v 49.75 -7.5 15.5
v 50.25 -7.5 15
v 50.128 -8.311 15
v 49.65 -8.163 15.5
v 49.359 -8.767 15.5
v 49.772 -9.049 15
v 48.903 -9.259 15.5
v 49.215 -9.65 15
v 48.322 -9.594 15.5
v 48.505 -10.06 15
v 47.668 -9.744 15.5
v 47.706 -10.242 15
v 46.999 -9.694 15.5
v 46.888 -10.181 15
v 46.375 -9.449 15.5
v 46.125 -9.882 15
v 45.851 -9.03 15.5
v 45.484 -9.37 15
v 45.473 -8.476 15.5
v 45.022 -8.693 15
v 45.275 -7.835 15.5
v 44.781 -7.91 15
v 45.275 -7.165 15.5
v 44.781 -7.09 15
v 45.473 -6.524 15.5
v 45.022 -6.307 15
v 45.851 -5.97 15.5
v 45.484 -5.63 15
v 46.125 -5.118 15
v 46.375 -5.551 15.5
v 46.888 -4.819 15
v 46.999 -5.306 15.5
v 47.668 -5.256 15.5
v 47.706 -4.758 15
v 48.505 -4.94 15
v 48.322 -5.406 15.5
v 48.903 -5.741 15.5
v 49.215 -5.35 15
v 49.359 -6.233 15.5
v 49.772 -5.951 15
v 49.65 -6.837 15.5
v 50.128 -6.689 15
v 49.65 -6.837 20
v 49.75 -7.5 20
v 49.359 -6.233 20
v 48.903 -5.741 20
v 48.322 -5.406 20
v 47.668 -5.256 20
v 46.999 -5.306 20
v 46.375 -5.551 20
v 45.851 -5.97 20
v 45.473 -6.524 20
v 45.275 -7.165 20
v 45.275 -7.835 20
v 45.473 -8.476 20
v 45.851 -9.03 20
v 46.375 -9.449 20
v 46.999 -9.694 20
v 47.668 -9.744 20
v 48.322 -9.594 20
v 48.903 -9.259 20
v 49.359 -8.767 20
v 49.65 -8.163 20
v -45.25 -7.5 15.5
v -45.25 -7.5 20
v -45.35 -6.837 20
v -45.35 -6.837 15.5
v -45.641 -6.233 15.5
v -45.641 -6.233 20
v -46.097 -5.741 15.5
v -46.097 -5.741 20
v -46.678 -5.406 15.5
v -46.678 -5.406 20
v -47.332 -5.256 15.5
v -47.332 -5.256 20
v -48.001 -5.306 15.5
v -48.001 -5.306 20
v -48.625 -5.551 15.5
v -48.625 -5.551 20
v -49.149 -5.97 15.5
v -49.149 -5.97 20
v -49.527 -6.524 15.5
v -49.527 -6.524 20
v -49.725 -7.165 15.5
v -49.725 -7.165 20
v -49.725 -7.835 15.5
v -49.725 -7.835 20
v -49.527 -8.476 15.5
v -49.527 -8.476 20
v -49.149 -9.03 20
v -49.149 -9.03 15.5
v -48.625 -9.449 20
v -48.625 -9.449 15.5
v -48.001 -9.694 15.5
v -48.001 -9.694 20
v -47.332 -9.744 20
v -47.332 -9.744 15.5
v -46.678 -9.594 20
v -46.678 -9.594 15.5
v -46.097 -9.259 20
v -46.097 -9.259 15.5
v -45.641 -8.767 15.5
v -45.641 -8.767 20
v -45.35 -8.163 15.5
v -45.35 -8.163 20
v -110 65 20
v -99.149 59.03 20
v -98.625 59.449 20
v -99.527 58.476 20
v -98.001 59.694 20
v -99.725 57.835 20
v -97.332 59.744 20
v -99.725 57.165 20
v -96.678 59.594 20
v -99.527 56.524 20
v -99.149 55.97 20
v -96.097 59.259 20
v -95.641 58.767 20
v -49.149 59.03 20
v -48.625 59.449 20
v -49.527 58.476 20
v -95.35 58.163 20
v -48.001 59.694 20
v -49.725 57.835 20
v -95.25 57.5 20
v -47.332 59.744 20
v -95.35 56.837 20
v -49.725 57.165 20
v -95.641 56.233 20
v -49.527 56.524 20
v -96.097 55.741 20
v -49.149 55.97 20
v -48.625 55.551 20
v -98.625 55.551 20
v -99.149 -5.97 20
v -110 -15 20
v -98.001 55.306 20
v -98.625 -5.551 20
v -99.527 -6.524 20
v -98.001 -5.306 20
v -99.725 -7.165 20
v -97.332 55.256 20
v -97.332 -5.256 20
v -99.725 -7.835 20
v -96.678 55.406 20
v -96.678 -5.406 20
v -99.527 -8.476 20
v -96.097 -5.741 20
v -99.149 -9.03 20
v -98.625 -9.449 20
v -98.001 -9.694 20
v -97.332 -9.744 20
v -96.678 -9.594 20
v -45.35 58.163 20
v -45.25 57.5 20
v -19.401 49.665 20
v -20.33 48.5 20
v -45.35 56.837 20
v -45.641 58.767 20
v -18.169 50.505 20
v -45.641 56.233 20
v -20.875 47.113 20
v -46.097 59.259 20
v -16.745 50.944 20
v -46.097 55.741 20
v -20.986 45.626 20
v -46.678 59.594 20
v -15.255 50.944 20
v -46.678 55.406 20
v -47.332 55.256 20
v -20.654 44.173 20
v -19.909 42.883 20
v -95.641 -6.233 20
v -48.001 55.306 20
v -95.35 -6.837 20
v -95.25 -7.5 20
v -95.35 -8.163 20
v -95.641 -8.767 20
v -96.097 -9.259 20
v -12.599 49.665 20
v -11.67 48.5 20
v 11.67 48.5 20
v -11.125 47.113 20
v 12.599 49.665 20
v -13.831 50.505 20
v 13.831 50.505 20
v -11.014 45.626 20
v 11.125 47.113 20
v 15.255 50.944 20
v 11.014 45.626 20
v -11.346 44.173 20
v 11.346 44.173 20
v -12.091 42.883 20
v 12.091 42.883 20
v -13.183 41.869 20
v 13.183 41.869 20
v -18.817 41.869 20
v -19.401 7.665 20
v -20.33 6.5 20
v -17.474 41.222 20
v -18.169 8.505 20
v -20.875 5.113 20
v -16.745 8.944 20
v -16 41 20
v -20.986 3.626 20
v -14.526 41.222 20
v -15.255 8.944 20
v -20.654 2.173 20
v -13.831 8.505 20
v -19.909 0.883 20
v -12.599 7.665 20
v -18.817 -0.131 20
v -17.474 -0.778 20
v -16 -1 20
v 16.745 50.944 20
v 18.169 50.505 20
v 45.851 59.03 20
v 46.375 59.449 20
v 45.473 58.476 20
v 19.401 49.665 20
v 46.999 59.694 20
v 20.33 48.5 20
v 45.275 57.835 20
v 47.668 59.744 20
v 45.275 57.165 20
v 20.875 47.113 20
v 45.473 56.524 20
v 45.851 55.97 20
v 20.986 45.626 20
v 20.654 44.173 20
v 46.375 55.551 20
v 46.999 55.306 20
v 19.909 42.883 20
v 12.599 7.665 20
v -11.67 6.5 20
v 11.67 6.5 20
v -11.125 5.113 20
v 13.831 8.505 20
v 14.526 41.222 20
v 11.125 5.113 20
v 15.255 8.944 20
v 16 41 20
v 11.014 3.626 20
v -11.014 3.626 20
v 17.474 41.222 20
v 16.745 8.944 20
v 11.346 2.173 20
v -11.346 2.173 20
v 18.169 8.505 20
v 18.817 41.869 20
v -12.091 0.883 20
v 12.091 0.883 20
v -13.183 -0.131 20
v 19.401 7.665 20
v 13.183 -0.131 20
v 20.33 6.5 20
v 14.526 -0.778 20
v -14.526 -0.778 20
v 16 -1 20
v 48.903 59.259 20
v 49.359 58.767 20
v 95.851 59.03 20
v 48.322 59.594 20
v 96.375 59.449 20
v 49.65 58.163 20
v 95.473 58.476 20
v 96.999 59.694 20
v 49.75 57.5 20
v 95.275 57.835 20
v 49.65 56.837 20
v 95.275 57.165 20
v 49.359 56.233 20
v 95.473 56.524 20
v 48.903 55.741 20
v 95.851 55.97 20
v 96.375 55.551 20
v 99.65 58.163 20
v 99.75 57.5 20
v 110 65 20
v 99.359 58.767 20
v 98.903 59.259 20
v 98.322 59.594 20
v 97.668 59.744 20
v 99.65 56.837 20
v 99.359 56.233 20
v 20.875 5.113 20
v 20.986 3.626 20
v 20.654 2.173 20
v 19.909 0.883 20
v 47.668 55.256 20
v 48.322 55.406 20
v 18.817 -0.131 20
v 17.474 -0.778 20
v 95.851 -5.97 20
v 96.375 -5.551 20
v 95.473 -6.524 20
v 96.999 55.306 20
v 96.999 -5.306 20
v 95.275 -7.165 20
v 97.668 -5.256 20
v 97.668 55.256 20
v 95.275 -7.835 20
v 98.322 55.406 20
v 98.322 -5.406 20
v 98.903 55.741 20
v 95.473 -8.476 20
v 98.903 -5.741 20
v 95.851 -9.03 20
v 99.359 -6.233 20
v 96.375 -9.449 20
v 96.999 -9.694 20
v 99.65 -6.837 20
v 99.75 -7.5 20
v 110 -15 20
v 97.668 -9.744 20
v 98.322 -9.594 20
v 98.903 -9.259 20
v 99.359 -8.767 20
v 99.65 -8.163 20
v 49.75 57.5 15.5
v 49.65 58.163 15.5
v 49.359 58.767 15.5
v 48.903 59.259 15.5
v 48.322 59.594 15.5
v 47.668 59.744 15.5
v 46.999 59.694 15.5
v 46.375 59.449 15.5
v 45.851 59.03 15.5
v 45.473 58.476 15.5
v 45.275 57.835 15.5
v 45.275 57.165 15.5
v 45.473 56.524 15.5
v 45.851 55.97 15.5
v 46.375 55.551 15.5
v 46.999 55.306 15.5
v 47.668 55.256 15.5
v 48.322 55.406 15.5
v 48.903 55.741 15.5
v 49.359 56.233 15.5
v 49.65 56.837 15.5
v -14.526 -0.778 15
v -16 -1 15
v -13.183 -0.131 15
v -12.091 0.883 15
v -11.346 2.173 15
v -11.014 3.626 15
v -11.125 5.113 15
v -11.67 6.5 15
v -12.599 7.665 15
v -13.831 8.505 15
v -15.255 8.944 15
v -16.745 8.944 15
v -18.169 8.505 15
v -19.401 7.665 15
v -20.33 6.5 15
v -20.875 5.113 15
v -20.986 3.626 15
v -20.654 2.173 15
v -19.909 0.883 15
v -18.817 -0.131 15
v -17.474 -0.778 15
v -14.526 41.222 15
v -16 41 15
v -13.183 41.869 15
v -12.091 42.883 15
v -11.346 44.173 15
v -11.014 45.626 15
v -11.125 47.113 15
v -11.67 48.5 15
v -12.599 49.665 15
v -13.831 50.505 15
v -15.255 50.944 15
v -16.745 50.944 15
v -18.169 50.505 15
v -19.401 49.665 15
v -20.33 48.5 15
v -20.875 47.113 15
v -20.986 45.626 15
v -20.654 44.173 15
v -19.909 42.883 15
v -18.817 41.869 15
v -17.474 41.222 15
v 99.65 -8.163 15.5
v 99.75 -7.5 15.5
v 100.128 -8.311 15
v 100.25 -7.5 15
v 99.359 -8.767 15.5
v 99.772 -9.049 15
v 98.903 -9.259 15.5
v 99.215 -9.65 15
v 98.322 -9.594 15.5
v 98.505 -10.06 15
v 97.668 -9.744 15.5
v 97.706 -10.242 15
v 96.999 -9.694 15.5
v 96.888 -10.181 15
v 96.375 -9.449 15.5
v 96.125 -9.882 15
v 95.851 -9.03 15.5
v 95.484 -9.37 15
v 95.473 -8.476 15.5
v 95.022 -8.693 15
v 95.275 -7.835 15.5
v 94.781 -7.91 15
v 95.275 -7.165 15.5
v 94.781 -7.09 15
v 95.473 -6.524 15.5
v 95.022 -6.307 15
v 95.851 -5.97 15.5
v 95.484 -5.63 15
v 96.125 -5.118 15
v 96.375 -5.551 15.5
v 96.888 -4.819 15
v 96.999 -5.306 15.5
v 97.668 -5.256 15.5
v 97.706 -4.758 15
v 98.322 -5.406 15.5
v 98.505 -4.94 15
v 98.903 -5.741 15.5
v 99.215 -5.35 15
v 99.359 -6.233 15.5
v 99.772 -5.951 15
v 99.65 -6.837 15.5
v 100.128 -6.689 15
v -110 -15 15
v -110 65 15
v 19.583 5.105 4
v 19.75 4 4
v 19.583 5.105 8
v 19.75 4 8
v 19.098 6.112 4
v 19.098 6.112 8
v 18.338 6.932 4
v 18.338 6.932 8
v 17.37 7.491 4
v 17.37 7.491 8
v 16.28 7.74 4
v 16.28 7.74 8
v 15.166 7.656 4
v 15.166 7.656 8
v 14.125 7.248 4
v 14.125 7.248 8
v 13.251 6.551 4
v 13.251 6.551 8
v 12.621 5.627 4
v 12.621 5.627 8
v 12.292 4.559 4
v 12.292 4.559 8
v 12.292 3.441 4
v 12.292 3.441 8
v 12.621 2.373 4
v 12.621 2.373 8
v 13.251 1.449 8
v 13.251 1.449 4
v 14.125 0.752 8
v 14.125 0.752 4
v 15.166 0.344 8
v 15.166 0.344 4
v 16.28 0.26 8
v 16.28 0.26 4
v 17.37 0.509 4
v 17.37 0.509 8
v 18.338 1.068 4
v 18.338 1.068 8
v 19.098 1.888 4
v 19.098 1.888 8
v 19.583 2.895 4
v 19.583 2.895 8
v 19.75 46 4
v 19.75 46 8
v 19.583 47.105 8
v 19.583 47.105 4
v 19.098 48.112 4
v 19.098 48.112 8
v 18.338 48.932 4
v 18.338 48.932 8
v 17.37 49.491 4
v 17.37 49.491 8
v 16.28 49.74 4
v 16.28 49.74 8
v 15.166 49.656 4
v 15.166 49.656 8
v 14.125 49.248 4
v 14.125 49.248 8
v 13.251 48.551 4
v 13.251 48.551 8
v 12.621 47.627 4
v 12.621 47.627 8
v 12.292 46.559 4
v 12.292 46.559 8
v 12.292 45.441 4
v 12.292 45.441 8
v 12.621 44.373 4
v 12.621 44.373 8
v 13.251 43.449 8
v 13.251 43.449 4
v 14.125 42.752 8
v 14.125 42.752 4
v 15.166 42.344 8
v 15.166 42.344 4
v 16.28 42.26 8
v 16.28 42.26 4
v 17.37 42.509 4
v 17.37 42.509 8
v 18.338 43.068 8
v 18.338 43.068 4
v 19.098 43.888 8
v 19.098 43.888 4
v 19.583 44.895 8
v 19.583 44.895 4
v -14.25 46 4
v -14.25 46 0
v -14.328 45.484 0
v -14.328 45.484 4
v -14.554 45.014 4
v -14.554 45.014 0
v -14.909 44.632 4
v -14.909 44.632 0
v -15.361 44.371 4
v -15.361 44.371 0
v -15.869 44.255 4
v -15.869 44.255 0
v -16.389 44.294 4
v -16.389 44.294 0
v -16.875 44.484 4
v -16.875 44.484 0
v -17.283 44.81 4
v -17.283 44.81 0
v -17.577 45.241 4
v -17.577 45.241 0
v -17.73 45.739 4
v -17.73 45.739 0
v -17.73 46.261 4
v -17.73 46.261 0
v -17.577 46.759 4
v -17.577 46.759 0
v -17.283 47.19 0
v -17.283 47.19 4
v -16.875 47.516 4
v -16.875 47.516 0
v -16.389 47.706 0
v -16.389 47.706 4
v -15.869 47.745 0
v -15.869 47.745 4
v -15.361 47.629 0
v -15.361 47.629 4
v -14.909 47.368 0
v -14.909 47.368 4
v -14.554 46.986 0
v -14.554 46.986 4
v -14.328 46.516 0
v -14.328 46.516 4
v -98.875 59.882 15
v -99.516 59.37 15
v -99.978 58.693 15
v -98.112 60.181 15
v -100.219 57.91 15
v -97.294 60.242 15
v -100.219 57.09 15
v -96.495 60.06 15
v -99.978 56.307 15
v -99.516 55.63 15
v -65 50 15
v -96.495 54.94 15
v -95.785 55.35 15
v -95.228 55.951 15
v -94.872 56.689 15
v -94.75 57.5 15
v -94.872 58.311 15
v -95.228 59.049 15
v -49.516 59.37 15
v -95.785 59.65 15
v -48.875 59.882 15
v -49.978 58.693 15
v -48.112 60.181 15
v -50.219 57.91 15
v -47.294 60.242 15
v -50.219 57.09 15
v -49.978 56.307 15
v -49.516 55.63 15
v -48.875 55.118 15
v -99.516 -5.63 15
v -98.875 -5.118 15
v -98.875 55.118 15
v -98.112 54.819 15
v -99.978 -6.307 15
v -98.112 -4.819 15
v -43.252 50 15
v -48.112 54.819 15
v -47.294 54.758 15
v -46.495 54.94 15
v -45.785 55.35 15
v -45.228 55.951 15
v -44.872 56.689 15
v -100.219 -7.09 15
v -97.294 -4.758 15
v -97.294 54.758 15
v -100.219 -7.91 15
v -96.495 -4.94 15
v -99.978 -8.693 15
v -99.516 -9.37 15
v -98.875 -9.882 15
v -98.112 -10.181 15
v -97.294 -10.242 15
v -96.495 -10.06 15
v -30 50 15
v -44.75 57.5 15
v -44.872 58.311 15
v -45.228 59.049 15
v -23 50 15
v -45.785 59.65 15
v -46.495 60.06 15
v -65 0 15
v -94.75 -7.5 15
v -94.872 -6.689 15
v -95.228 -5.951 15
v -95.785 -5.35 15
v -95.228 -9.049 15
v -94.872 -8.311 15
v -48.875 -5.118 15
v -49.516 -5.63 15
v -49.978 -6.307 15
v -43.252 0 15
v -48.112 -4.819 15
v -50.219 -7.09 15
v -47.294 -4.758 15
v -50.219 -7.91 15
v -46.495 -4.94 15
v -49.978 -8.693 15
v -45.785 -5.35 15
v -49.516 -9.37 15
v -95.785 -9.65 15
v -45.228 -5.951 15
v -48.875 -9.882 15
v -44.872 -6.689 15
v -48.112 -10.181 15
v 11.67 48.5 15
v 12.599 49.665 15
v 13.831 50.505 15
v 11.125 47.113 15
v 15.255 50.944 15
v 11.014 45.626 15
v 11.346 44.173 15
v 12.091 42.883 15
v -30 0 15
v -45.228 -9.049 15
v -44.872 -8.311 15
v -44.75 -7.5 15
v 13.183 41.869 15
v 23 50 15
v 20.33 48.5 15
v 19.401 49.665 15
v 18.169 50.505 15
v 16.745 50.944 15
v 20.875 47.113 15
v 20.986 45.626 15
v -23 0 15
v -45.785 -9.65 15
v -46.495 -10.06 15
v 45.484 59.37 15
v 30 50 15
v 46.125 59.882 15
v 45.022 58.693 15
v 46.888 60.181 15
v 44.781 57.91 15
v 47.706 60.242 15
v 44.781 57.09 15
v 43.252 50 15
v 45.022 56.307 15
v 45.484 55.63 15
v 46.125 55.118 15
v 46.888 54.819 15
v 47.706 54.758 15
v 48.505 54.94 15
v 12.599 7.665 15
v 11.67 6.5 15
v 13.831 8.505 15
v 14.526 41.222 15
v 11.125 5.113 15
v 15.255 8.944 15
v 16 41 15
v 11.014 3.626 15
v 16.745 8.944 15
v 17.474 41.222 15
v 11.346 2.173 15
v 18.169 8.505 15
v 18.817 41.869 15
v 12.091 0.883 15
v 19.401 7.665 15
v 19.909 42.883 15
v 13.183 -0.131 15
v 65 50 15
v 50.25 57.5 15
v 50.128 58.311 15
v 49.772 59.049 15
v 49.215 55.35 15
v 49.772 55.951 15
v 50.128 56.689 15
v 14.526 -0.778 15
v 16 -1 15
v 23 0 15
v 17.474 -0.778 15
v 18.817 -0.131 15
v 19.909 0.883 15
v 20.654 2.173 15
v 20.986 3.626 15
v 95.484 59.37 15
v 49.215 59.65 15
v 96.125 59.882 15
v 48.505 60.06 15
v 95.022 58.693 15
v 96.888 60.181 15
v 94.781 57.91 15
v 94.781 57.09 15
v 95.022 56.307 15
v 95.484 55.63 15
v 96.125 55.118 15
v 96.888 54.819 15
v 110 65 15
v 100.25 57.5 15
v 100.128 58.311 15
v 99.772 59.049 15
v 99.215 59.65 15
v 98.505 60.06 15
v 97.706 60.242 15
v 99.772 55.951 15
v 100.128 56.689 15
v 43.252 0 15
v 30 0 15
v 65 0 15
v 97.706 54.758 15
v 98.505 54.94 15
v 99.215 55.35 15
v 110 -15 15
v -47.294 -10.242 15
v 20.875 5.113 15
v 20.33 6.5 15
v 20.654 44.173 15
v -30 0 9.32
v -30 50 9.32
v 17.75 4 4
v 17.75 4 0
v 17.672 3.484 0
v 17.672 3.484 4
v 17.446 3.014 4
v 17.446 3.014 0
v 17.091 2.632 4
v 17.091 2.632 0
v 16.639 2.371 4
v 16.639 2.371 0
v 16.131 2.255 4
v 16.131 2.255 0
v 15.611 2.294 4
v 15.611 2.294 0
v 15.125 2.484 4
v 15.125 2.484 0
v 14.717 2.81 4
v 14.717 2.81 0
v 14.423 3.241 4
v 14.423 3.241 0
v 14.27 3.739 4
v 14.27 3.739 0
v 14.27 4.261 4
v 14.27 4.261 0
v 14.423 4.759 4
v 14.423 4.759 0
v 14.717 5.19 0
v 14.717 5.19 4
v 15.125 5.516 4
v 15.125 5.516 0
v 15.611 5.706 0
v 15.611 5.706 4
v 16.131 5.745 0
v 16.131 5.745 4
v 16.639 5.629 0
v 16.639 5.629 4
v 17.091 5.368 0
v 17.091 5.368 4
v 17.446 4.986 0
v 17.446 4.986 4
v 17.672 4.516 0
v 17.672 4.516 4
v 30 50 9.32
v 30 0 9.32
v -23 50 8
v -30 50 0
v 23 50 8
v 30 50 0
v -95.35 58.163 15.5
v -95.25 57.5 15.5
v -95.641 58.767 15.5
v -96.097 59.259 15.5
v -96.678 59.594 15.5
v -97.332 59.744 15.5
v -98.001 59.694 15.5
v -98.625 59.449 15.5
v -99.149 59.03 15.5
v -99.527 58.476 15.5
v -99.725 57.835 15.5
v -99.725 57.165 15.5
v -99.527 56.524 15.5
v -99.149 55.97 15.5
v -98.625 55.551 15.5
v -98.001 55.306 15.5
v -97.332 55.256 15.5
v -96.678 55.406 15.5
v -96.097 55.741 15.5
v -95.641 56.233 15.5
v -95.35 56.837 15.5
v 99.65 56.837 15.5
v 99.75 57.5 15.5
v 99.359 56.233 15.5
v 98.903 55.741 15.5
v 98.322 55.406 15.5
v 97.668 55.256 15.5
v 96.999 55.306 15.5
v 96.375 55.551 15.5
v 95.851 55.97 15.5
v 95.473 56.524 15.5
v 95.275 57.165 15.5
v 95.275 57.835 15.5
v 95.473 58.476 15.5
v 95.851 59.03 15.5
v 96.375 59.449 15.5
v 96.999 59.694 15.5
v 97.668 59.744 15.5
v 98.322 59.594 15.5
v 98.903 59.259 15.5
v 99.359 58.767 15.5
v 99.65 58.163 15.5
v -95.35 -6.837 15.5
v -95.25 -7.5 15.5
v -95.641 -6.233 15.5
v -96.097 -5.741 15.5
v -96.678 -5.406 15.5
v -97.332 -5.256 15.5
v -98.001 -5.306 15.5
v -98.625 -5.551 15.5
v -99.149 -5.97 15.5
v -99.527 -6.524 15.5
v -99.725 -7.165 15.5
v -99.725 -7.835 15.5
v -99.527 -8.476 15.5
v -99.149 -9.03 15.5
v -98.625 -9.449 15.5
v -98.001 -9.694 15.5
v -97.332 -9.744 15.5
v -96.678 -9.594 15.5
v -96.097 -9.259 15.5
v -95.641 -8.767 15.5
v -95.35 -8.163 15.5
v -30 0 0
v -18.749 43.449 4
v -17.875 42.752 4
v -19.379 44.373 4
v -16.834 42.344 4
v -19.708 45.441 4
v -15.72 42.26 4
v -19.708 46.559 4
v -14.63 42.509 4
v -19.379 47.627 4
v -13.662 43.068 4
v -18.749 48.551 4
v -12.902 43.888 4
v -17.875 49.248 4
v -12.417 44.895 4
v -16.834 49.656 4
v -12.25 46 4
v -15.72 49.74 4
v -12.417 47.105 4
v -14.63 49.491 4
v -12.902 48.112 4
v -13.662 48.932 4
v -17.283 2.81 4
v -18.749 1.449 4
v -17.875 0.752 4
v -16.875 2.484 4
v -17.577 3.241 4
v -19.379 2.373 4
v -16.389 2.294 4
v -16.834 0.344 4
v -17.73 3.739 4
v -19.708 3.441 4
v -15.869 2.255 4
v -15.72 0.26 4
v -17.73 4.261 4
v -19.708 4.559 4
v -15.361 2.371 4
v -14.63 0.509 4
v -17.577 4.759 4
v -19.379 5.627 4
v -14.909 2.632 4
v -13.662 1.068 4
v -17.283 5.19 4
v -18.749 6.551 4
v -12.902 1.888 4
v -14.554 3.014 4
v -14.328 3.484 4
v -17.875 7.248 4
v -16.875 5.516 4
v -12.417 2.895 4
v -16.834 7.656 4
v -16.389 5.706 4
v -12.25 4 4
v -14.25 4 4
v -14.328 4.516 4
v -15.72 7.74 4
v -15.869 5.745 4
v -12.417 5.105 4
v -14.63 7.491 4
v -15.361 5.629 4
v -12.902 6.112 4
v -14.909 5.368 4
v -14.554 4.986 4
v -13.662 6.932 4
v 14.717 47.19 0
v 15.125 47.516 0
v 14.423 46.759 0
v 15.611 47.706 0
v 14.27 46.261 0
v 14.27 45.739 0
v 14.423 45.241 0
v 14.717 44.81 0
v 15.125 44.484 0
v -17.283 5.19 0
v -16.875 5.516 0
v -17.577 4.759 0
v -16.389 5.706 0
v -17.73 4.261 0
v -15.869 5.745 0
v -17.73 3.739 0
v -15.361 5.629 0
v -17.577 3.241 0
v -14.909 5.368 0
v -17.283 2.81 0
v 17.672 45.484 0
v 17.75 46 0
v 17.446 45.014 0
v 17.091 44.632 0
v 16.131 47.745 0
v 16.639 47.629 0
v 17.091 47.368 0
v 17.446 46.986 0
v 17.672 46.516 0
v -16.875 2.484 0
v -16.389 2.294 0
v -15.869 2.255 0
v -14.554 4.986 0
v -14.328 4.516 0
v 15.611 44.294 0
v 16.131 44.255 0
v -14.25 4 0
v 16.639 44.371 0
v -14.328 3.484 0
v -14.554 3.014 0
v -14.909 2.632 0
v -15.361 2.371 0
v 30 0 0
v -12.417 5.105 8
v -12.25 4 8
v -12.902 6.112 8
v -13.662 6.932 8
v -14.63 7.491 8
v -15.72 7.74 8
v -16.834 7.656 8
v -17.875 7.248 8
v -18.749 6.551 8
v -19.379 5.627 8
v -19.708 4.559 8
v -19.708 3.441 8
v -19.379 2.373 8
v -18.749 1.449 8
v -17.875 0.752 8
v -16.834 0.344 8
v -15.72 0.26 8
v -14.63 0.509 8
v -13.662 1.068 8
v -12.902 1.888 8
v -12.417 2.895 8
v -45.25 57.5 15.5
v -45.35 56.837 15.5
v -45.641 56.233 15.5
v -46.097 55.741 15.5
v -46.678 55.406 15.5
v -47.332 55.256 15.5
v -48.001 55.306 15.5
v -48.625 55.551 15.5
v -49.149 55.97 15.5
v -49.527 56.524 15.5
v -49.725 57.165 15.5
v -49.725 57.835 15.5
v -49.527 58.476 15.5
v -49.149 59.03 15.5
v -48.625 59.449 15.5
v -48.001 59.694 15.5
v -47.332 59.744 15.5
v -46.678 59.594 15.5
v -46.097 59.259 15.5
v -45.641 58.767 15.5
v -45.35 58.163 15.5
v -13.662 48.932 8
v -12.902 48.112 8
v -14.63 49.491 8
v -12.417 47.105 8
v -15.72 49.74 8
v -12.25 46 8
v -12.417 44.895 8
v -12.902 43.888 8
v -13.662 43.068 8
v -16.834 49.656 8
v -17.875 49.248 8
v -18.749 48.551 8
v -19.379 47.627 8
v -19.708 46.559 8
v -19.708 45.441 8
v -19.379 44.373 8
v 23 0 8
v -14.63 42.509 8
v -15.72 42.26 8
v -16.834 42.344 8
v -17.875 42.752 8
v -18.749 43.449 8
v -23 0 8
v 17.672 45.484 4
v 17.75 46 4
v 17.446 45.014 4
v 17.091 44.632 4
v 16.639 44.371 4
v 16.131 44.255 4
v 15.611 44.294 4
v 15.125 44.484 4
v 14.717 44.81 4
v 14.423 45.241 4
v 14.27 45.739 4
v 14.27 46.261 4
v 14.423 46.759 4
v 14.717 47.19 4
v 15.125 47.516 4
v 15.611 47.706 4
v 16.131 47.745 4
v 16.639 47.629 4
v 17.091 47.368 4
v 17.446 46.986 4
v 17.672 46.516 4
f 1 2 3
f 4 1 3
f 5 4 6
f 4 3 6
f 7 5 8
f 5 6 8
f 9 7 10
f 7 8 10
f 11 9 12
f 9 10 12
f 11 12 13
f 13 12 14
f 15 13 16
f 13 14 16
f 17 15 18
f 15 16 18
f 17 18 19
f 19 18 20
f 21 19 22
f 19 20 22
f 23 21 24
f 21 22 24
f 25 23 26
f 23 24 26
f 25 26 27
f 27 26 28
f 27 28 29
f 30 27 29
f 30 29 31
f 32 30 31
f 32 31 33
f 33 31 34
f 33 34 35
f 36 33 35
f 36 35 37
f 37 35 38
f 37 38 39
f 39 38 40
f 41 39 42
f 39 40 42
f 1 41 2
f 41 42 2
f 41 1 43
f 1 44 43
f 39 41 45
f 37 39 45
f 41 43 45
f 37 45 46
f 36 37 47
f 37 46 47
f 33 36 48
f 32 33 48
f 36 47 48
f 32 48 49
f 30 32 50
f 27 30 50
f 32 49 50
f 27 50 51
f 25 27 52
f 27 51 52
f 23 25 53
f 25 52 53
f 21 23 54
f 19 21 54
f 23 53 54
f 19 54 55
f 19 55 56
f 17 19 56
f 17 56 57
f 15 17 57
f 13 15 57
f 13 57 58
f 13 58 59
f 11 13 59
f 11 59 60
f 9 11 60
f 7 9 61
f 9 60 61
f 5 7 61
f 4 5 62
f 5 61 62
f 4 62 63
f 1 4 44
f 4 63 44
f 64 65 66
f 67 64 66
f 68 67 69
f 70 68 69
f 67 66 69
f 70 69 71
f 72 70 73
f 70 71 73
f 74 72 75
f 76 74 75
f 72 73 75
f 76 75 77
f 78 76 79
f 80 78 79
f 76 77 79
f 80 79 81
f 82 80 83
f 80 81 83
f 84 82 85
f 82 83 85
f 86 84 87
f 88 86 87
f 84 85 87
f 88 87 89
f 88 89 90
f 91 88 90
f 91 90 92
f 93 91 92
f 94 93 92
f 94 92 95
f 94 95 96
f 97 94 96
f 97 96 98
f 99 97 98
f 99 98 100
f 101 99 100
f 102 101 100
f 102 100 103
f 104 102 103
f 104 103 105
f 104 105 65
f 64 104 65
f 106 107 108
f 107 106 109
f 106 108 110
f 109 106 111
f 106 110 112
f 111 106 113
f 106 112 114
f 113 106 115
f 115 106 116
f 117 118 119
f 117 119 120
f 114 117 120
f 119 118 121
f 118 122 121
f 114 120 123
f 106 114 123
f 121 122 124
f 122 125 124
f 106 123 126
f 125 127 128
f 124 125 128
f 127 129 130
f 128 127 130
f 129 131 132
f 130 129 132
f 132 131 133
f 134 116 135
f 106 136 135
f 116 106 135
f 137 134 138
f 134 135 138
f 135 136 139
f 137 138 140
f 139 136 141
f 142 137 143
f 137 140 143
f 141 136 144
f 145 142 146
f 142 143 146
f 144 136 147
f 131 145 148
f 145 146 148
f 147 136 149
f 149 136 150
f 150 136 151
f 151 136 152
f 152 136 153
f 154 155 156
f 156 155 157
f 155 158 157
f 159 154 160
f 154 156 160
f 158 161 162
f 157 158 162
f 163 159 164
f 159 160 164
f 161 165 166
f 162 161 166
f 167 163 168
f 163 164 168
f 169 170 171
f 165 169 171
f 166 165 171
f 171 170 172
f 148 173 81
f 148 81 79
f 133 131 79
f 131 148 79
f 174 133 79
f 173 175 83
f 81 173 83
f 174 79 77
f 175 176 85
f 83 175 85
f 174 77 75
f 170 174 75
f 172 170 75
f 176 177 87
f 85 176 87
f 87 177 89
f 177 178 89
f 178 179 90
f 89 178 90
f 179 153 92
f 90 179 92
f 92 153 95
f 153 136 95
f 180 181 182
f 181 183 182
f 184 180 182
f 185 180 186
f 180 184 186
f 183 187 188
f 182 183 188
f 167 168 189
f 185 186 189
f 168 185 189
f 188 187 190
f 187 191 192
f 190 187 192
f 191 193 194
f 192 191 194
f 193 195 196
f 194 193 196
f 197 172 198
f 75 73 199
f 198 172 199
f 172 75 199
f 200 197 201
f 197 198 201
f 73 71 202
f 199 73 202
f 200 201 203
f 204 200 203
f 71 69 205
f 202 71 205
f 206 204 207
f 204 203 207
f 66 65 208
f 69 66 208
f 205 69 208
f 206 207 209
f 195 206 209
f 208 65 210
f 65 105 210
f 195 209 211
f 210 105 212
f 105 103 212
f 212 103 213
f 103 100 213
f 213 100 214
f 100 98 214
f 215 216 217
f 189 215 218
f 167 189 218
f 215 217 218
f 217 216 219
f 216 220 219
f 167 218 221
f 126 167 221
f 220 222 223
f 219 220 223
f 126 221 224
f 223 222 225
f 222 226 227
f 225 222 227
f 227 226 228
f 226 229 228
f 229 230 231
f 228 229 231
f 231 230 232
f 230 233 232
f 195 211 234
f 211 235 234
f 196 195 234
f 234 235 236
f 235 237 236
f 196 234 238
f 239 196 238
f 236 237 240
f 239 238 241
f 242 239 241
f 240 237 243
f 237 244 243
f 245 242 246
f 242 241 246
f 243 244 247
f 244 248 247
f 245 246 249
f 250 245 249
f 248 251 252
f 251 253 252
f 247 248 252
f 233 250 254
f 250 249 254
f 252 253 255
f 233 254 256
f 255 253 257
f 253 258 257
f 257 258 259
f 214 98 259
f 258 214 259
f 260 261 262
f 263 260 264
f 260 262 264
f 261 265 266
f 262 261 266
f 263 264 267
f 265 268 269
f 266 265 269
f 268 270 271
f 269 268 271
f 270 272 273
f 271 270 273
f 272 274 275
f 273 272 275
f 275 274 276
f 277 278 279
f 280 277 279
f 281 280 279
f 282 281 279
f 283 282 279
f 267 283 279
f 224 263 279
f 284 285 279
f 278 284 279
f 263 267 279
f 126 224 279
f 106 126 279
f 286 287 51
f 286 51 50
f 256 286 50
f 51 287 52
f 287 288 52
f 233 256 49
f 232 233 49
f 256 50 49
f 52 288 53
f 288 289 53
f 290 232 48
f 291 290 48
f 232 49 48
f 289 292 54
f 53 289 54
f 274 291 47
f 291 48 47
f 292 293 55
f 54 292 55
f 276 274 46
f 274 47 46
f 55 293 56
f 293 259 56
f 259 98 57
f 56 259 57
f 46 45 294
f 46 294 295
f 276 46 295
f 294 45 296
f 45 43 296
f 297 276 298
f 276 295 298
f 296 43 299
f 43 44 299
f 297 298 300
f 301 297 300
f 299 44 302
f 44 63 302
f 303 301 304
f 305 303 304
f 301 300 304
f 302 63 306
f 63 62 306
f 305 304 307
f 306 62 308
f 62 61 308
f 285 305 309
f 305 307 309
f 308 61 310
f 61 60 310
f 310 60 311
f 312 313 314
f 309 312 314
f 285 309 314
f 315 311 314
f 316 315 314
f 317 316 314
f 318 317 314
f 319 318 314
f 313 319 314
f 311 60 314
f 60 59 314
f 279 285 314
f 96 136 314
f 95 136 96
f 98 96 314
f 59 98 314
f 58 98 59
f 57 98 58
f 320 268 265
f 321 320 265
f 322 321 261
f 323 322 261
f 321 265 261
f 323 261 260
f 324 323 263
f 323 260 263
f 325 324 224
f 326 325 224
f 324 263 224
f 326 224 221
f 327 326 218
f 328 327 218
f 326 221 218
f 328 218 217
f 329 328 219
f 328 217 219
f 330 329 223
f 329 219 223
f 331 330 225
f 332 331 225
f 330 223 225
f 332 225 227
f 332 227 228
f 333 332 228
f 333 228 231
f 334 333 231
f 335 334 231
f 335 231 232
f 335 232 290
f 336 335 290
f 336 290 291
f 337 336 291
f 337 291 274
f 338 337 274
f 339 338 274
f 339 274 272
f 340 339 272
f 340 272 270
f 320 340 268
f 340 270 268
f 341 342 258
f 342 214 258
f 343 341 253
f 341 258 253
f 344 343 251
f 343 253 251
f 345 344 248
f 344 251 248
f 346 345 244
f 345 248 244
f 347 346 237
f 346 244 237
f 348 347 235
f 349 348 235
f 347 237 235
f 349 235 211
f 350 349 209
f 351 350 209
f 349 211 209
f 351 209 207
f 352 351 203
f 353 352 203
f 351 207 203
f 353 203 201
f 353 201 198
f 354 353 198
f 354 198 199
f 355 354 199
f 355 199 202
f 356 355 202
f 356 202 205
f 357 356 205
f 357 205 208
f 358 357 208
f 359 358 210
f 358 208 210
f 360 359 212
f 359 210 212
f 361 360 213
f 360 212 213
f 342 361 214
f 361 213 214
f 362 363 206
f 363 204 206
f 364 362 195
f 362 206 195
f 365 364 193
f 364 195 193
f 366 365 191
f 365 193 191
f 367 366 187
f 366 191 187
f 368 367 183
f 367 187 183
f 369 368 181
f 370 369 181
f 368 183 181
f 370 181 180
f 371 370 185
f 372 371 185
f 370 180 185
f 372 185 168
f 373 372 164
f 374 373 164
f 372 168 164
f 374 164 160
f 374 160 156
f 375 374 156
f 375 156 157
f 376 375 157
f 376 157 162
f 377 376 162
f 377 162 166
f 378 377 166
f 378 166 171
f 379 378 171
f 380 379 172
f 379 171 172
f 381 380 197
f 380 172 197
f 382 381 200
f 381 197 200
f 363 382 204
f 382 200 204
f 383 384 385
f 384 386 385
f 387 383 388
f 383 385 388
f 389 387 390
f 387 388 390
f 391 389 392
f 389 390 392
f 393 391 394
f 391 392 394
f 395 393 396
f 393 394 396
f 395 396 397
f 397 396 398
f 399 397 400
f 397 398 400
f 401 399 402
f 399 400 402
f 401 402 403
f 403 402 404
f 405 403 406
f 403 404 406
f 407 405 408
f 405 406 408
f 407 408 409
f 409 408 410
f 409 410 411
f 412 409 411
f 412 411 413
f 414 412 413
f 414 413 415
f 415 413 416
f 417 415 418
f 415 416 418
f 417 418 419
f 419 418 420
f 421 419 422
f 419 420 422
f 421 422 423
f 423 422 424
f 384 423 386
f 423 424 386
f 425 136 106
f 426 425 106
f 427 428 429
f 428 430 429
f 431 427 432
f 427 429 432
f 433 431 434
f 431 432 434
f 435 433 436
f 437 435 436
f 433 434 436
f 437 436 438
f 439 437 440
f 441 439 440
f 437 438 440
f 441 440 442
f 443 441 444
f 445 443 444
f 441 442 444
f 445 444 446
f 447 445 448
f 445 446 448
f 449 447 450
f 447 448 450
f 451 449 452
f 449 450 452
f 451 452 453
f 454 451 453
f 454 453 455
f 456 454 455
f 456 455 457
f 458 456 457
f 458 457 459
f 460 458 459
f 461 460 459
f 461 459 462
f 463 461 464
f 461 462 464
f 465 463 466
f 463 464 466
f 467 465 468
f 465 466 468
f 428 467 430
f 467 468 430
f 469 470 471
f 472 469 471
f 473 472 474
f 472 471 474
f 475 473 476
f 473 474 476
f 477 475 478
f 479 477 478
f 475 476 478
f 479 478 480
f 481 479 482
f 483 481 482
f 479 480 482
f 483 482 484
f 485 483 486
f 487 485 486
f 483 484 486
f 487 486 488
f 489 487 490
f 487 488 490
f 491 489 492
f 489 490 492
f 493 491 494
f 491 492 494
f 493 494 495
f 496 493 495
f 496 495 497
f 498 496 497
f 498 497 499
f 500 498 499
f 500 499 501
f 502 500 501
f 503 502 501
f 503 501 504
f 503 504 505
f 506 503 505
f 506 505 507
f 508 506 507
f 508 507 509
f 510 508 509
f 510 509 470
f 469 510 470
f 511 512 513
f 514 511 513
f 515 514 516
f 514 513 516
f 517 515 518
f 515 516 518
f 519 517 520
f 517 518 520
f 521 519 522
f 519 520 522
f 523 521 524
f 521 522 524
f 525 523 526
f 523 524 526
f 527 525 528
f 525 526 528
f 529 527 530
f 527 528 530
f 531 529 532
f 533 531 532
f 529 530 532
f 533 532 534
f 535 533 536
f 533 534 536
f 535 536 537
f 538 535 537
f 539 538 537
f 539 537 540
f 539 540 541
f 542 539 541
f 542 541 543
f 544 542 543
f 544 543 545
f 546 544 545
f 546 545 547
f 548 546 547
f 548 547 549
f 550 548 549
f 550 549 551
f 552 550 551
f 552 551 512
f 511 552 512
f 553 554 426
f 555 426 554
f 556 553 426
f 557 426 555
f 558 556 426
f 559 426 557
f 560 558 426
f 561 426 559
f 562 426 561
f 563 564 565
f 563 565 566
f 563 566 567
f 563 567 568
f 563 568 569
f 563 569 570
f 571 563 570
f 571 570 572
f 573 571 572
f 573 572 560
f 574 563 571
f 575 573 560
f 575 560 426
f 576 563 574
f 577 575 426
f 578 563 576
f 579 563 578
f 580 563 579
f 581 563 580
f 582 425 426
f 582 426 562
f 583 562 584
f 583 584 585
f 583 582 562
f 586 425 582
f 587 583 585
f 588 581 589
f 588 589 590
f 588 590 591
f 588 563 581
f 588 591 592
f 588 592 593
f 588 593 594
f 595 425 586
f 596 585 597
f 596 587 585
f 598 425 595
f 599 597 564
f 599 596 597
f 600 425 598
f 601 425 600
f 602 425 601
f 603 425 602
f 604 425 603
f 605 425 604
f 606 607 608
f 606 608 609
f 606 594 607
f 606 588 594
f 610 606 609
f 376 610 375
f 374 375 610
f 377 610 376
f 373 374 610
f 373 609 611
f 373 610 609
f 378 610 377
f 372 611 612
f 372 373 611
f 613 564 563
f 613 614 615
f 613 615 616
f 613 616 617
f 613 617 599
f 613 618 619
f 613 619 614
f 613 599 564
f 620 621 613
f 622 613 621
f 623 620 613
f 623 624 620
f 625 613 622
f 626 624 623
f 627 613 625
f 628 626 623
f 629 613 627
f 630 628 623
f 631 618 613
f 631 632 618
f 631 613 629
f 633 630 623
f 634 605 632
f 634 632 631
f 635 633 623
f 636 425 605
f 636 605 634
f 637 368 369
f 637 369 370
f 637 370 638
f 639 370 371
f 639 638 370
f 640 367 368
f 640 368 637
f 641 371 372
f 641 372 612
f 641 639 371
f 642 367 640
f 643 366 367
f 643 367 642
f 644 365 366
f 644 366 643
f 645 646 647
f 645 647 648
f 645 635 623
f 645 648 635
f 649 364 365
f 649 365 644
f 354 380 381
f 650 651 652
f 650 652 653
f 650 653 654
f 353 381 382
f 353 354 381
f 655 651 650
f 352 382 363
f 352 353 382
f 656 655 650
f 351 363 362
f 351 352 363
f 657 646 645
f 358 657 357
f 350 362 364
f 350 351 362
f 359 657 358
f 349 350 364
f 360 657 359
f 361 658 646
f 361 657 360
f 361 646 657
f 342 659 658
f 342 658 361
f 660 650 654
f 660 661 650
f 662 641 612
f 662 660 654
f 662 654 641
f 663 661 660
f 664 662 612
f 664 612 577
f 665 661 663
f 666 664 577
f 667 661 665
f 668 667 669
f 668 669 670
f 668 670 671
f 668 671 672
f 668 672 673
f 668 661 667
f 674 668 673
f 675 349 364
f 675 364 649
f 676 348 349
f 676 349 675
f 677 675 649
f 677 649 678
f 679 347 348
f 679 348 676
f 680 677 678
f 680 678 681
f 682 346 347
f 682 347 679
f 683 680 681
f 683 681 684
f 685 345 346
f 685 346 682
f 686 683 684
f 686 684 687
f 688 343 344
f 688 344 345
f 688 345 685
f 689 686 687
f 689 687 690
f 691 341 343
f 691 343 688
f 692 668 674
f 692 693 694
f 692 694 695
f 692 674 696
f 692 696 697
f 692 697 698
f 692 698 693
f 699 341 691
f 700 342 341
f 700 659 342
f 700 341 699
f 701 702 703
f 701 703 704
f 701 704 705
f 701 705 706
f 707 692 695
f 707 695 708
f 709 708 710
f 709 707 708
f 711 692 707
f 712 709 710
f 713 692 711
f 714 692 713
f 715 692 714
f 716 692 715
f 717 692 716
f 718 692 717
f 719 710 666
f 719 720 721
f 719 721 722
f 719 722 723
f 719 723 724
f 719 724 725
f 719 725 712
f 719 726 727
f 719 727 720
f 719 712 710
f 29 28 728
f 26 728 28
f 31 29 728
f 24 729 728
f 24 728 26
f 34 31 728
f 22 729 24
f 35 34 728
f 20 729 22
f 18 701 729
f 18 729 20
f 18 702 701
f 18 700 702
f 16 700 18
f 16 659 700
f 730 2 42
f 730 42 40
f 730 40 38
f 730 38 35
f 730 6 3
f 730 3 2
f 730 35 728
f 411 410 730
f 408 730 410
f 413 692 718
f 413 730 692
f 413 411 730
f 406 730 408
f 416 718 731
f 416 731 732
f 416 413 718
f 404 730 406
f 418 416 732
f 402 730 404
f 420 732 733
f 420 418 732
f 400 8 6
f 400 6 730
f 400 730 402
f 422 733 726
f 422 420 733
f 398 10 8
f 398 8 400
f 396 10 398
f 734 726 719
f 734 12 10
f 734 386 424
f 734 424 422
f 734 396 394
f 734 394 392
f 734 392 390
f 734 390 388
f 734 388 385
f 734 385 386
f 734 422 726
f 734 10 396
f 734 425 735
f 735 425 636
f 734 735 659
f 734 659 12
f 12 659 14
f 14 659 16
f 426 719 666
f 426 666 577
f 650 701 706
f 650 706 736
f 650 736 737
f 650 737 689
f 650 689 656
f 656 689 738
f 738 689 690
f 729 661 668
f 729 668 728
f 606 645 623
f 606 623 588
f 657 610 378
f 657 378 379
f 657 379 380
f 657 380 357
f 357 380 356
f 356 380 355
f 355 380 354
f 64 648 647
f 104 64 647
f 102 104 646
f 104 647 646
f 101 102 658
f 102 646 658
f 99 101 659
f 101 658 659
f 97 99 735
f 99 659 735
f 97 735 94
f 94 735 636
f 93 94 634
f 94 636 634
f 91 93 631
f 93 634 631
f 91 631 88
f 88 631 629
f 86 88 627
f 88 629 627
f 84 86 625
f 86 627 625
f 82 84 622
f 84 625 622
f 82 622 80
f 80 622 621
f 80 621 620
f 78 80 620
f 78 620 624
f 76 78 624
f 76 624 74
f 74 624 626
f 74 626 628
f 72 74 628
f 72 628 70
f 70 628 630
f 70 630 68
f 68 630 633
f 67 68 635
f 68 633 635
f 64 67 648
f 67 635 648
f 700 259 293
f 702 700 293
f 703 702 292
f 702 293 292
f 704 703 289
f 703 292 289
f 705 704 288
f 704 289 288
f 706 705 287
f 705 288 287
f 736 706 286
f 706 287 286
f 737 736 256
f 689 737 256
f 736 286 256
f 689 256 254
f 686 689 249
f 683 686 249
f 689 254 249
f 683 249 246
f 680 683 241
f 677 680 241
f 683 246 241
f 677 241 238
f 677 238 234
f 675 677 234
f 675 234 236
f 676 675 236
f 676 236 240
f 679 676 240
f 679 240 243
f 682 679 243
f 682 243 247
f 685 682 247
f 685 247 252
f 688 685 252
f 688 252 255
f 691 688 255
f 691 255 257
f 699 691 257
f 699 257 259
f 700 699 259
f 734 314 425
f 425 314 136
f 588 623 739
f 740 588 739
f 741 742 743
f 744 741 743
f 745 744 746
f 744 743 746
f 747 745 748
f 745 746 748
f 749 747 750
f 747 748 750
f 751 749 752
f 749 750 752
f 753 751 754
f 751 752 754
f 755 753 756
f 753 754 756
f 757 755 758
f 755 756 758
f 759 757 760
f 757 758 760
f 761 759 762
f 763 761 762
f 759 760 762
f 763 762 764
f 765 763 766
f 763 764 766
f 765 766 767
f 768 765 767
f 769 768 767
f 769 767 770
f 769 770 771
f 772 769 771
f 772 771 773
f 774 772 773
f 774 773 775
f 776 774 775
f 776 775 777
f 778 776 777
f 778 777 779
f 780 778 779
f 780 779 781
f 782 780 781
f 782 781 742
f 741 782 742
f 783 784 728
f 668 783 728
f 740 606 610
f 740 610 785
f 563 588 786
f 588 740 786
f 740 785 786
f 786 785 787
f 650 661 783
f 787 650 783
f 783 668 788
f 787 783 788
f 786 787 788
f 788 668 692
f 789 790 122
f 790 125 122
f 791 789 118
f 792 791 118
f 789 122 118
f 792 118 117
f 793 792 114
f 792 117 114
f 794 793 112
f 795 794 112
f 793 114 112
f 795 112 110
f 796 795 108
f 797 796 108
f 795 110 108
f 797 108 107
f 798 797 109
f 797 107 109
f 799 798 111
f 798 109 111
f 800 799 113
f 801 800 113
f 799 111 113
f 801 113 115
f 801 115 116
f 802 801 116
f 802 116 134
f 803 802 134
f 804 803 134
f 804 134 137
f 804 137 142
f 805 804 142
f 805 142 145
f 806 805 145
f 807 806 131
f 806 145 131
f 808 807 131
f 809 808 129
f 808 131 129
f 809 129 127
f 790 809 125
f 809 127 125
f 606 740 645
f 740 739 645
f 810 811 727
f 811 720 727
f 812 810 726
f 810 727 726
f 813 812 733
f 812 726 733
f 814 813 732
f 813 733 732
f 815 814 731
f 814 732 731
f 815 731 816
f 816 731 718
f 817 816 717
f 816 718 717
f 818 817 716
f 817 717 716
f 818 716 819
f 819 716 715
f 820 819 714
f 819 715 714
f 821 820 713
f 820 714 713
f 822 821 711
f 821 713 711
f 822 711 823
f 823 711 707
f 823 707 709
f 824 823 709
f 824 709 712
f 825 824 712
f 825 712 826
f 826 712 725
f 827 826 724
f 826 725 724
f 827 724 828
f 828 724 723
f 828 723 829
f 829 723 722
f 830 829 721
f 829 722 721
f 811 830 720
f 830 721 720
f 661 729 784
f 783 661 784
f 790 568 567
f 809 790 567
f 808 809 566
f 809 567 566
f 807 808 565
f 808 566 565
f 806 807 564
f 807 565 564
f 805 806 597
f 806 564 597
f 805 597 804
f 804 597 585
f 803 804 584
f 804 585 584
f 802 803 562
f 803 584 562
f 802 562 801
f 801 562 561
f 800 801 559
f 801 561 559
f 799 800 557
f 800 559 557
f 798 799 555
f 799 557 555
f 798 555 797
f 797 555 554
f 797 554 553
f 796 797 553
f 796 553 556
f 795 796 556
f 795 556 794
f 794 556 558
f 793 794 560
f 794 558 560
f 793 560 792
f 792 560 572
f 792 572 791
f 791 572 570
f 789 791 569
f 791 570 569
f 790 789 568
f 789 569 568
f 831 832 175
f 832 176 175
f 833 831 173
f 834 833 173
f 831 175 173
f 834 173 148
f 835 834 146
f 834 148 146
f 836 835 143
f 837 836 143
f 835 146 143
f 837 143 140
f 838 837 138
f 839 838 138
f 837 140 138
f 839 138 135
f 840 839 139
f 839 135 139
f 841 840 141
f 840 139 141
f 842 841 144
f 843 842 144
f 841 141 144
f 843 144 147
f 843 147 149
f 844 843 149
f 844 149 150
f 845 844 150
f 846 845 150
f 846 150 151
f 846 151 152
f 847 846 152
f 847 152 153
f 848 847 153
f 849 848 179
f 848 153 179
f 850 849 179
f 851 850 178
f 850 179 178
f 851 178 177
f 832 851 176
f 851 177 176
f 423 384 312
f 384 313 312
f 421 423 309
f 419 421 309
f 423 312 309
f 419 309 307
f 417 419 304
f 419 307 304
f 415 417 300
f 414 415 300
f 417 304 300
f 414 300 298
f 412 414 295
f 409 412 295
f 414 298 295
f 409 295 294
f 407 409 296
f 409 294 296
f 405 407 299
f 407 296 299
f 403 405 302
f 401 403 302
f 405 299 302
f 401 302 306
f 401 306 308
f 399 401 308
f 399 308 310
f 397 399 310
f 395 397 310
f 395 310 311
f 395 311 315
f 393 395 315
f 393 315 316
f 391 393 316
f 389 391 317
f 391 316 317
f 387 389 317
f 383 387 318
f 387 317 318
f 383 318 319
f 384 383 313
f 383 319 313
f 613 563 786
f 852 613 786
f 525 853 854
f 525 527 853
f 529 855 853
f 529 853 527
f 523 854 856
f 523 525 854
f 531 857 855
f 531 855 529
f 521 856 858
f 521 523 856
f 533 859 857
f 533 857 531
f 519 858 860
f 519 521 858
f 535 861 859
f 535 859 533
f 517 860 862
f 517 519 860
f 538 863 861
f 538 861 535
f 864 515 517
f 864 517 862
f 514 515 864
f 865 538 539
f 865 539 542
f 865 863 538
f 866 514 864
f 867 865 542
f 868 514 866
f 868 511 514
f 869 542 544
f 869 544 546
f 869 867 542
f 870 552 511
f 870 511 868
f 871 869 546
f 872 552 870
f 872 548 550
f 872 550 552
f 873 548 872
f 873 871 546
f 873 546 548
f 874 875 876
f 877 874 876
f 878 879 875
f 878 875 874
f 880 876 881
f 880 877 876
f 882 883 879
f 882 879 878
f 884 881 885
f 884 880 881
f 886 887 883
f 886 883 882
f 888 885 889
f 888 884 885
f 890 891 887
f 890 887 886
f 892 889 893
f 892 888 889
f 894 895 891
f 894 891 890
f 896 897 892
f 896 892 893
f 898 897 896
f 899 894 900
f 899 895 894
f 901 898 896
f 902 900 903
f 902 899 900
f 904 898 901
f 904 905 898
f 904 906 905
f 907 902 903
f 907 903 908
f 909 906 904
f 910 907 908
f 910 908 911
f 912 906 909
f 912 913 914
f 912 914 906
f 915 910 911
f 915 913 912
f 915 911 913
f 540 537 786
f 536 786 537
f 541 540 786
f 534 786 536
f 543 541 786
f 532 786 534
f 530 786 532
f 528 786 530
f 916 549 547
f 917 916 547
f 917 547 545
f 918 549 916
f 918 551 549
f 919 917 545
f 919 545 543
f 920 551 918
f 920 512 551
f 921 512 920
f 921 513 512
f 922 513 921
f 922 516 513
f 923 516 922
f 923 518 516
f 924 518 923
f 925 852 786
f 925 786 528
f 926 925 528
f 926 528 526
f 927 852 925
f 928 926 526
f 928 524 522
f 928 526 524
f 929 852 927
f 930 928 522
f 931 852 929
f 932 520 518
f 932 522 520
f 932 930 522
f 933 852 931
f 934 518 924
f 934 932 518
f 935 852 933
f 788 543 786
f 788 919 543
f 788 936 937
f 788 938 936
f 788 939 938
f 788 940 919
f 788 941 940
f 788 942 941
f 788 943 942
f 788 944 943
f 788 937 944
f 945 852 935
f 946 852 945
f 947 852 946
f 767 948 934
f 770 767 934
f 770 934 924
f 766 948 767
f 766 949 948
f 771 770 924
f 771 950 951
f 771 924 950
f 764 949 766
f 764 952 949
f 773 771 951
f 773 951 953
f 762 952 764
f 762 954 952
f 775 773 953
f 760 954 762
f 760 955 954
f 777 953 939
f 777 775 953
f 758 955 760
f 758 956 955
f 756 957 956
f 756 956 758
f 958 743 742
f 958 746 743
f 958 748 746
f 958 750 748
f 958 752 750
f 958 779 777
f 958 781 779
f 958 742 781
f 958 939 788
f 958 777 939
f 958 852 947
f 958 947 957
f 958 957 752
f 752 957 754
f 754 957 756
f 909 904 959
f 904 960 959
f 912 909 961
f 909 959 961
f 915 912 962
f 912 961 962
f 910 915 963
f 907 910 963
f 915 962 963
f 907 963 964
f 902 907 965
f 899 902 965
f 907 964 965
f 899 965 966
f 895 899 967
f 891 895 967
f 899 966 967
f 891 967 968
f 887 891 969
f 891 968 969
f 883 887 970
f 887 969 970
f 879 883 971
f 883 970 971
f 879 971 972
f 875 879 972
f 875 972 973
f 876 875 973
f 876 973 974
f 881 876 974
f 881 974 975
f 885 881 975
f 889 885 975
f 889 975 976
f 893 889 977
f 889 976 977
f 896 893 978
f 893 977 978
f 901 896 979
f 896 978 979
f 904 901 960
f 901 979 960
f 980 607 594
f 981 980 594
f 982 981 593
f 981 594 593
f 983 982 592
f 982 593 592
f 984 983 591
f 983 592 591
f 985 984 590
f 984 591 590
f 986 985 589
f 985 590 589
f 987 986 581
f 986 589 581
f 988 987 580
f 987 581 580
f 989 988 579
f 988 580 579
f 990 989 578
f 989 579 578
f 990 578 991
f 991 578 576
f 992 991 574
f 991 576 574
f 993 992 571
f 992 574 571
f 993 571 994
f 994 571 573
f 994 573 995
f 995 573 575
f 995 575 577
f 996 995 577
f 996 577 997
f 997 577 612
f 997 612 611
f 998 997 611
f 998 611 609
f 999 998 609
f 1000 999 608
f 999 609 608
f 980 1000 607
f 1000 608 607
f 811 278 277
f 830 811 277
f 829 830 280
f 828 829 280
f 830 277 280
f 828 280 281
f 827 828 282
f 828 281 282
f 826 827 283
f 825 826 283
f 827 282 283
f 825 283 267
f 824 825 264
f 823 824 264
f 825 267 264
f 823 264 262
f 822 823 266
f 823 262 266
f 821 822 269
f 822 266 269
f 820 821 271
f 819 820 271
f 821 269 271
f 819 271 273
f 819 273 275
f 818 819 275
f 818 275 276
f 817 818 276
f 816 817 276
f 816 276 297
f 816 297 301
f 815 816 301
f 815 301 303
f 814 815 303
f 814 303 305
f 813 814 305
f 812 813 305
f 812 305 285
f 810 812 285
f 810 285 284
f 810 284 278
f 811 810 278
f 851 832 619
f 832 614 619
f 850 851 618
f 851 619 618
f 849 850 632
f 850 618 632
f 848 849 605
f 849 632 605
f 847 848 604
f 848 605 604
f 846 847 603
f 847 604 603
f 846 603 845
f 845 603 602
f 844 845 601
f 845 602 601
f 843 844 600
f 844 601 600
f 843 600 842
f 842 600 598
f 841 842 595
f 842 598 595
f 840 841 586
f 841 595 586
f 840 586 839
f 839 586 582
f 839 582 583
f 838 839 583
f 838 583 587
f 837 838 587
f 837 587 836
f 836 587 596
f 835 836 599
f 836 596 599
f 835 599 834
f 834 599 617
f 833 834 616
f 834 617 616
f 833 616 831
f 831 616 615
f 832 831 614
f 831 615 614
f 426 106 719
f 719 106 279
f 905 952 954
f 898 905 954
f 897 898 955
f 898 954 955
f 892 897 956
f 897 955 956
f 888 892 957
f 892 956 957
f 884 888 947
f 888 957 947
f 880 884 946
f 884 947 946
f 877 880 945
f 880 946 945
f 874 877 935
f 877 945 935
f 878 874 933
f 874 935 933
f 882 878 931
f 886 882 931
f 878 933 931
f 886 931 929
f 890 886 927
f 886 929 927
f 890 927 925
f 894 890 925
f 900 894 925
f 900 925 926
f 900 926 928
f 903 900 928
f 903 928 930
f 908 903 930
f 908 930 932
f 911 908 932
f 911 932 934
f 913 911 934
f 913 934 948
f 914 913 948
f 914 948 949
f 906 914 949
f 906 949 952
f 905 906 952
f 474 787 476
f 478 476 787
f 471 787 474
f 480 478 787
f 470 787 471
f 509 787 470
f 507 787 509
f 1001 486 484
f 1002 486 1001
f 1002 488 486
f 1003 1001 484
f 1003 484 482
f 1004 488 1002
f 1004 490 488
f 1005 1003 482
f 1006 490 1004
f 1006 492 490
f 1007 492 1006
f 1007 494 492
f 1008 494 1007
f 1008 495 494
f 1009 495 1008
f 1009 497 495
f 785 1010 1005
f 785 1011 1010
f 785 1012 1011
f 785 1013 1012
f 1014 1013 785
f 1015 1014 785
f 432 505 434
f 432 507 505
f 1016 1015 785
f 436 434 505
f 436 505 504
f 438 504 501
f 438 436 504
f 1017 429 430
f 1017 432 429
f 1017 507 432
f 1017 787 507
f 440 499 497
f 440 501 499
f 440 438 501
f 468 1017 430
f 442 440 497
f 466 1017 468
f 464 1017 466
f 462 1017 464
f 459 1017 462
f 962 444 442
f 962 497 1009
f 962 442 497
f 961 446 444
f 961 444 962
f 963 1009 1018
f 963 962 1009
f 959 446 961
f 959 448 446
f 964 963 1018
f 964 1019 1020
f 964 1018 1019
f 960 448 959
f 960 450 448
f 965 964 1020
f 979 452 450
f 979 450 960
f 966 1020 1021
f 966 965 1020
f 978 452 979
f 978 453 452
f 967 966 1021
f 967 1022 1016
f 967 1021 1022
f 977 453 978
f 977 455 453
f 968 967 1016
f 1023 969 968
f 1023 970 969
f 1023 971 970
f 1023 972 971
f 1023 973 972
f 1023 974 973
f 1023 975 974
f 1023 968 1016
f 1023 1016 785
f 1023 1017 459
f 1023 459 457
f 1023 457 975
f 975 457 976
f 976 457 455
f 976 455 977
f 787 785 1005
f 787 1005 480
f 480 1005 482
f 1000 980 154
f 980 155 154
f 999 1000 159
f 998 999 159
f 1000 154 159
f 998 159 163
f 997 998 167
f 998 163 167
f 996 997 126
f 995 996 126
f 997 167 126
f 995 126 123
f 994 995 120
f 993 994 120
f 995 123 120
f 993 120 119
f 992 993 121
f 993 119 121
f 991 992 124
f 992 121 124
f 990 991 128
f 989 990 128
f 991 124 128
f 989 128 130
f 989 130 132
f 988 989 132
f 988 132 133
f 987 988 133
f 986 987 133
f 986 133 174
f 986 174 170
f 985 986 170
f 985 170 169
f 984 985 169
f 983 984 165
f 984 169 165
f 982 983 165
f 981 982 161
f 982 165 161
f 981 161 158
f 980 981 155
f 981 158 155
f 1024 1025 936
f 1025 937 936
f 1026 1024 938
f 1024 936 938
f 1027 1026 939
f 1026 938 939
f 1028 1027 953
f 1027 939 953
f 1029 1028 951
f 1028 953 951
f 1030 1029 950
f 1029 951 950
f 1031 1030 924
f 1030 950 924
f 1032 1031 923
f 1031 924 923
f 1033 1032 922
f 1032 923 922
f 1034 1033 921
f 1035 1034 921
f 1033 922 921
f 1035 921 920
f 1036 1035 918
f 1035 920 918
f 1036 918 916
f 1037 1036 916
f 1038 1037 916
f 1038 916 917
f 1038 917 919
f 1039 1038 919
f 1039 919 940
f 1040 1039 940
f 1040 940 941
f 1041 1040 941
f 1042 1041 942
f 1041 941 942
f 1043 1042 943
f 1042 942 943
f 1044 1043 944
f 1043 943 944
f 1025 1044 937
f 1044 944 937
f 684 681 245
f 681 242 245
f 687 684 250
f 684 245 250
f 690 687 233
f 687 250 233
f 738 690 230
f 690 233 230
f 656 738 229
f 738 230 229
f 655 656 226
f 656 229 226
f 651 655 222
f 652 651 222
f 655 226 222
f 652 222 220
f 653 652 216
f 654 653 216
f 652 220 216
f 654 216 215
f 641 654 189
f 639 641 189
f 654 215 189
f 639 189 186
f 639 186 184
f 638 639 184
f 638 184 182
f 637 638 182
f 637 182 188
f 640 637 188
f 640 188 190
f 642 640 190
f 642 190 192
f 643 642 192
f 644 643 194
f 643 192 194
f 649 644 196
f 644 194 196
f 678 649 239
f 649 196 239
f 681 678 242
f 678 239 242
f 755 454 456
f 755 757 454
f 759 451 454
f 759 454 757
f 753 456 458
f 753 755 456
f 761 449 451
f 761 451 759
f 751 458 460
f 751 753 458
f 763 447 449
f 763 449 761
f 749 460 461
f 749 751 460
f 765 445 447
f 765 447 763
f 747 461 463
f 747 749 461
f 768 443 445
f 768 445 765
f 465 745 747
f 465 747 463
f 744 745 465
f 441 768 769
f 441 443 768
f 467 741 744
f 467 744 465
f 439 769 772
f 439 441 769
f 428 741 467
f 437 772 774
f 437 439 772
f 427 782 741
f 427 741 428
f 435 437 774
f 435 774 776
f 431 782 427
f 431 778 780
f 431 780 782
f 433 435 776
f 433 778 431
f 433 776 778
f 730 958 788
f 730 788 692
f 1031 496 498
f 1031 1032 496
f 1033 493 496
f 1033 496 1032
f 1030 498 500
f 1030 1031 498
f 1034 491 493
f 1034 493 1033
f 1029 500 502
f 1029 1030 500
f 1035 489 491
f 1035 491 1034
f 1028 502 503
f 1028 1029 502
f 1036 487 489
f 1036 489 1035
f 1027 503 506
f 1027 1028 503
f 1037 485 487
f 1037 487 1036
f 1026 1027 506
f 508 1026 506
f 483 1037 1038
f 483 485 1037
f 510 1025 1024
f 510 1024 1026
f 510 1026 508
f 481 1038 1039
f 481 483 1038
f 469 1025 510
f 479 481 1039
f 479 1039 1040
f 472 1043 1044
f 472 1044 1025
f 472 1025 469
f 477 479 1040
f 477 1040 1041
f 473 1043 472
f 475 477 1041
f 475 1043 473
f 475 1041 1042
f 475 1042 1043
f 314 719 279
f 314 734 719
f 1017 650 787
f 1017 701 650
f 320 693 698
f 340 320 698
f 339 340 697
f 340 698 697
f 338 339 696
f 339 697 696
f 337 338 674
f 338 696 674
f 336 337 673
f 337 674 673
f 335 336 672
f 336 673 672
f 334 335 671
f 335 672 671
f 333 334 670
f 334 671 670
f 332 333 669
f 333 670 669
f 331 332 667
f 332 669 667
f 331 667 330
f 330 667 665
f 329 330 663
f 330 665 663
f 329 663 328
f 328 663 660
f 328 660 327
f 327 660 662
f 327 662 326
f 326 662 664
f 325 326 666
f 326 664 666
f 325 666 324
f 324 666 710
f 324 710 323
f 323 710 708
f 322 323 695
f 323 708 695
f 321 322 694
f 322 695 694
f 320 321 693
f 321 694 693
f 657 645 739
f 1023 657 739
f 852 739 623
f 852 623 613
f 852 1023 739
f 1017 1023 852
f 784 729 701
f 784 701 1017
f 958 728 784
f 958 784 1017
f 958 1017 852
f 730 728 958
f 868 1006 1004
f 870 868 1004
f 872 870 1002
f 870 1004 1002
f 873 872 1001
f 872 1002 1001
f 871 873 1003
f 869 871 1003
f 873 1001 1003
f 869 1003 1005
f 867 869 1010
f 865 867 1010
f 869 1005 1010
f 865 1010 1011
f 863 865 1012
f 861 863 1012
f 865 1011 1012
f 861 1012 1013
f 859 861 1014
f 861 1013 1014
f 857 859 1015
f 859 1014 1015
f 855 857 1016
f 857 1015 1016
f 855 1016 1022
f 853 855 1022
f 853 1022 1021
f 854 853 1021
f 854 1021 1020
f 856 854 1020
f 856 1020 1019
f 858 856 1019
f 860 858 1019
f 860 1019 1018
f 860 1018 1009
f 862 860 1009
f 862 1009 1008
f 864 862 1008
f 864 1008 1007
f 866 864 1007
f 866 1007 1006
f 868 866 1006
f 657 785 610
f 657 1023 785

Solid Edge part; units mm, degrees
sketch "Sketch1" plane through (0, 0, 0) normal (0, -1, 0) x (1, 0, 0)
  line L0 (30, 0) -> (65, 15)
  line L1 (65, 15) -> (110, 15)
  line L2 (110, 15) -> (110, 20)
  line L3 (0, 20) -> (110, 20)
  line L4 (0, 20) -> (0, 15)
  line L5 (0, 15) -> (23, 15)
  line L6 (23, 15) -> (23, 8)
  line L7 (23, 8) -> (0, 8)
  line L8 (0, 8) -> (0, 0)
  line L9 (0, 0) -> (30, 0)
  dimension "D1" = 30
  dimension "D2" = 23
  dimension "D3" = 8
  dimension "D4" = 65
  dimension "D5" = 20
  dimension "D6" = 5
  dimension "D7" = 110
extrude "Protrusion1" add sketch "Sketch1" against normal blind 50
mirror "Mirror1" about plane through (0, 25, 4) normal (-1, 0, 0) of "Protrusion1"
sketch "Sketch2" plane through (0, 0, 26) normal (0, -1, 0) x (1, 0, 0)
  line L0 (30, -16.6796) -> (43.2525, -11)
  line L1 (43.2525, -11) -> (30, -11)
  line L2 (30, -11) -> (30, -16.6796)
extrude "Cutout1" cut sketch "Sketch2" against normal through all
sketch "Sketch3" plane through (0, 25, 0) normal (0, 0, -1) x (1, 0, 0)
  circle A0 centre (-16, 21) radius 1.75
  circle A1 centre (16, 21) radius 1.75
  circle A2 centre (16, -21) radius 1.75
  circle A3 centre (-16, -21) radius 1.75
  dimension "D1" = 3.5
  dimension "D2" = 32
  dimension "D3" = 42
extrude "Cutout2" cut sketch "Sketch3" against normal up to next
sketch "Sketch4" plane through (0, 25, 8) normal (0, 0, 1) x (1, 0, 0)
  circle A0 centre (-16, -21) radius 3.75
  circle A1 centre (16, -21) radius 3.75
  circle A2 centre (-16, 21) radius 3.75
  circle A3 centre (16, 21) radius 3.75
  dimension "D1" = 7.5
extrude "Extrusionsausschnitt_4" cut sketch "Sketch4" against normal blind 4
mirror "Mirror2" about plane through (0, 0, 0) normal (1, 0, 0) of "Cutout1"
sketch "Sketch5" plane through (0, 25, 20) normal (0, 0, 1) x (1, 0, 0)
  line L0 (110, -40) -> (-110, -40)
  line L1 (-110, -40) -> (-110, 40)
  line L2 (-110, 40) -> (110, 40)
  line L3 (110, 40) -> (110, -40)
  dimension "D1" = 220
  dimension "D2" = 40
extrude "Protrusion2" add sketch "Sketch5" against normal up to vertex (5 mm away)
sketch "Sketch6" plane through (0, 25, 20) normal (0, 0, 1) x (1, 0, 0)
  circle A0 centre (-97.5, -32.5) radius 2.25
  circle A1 centre (-47.5, 32.5) radius 2.25
  circle A2 centre (-47.5, -32.5) radius 2.25
  circle A3 centre (47.5, 32.5) radius 2.25
  circle A4 centre (47.5, -32.5) radius 2.25
  circle A5 centre (97.5, -32.5) radius 2.25
  circle A6 centre (97.5, 32.5) radius 2.25
  circle A7 centre (-97.5, 32.5) radius 2.25
  dimension "D1" = 4.5
  dimension "D2" = 50
  dimension "D3" = 145
  dimension "D4" = 65
  dimension "D5" = 50
extrude "Cutout3" cut sketch "Sketch6" against normal up to next
chamfer "Fase_2" distance 0.5 angle 45 8 edges at (-95.25, -7.5, 15) (-95.25, 57.5, 15) (-45.25, 57.5, 15) (49.75, 57.5, 15) (99.75, 57.5, 15) (99.75, -7.5, 15) (49.75, -7.5, 15) (-45.25, -7.5, 15)
hole "Hole_1" at (-16, 46, 20) direction (0, 0, -1) diameter 10 end up to next
hole "Hole1" at (-16, 4, 20) direction (0, 0, -1) diameter 10 end up to next
hole "Hole2" at (16, 4, 20) direction (0, 0, -1) diameter 10 end up to next
hole "Hole3" at (16, 46, 20) direction (0, 0, -1) diameter 10 end up to next
properties material "Nylon, allgemein"
